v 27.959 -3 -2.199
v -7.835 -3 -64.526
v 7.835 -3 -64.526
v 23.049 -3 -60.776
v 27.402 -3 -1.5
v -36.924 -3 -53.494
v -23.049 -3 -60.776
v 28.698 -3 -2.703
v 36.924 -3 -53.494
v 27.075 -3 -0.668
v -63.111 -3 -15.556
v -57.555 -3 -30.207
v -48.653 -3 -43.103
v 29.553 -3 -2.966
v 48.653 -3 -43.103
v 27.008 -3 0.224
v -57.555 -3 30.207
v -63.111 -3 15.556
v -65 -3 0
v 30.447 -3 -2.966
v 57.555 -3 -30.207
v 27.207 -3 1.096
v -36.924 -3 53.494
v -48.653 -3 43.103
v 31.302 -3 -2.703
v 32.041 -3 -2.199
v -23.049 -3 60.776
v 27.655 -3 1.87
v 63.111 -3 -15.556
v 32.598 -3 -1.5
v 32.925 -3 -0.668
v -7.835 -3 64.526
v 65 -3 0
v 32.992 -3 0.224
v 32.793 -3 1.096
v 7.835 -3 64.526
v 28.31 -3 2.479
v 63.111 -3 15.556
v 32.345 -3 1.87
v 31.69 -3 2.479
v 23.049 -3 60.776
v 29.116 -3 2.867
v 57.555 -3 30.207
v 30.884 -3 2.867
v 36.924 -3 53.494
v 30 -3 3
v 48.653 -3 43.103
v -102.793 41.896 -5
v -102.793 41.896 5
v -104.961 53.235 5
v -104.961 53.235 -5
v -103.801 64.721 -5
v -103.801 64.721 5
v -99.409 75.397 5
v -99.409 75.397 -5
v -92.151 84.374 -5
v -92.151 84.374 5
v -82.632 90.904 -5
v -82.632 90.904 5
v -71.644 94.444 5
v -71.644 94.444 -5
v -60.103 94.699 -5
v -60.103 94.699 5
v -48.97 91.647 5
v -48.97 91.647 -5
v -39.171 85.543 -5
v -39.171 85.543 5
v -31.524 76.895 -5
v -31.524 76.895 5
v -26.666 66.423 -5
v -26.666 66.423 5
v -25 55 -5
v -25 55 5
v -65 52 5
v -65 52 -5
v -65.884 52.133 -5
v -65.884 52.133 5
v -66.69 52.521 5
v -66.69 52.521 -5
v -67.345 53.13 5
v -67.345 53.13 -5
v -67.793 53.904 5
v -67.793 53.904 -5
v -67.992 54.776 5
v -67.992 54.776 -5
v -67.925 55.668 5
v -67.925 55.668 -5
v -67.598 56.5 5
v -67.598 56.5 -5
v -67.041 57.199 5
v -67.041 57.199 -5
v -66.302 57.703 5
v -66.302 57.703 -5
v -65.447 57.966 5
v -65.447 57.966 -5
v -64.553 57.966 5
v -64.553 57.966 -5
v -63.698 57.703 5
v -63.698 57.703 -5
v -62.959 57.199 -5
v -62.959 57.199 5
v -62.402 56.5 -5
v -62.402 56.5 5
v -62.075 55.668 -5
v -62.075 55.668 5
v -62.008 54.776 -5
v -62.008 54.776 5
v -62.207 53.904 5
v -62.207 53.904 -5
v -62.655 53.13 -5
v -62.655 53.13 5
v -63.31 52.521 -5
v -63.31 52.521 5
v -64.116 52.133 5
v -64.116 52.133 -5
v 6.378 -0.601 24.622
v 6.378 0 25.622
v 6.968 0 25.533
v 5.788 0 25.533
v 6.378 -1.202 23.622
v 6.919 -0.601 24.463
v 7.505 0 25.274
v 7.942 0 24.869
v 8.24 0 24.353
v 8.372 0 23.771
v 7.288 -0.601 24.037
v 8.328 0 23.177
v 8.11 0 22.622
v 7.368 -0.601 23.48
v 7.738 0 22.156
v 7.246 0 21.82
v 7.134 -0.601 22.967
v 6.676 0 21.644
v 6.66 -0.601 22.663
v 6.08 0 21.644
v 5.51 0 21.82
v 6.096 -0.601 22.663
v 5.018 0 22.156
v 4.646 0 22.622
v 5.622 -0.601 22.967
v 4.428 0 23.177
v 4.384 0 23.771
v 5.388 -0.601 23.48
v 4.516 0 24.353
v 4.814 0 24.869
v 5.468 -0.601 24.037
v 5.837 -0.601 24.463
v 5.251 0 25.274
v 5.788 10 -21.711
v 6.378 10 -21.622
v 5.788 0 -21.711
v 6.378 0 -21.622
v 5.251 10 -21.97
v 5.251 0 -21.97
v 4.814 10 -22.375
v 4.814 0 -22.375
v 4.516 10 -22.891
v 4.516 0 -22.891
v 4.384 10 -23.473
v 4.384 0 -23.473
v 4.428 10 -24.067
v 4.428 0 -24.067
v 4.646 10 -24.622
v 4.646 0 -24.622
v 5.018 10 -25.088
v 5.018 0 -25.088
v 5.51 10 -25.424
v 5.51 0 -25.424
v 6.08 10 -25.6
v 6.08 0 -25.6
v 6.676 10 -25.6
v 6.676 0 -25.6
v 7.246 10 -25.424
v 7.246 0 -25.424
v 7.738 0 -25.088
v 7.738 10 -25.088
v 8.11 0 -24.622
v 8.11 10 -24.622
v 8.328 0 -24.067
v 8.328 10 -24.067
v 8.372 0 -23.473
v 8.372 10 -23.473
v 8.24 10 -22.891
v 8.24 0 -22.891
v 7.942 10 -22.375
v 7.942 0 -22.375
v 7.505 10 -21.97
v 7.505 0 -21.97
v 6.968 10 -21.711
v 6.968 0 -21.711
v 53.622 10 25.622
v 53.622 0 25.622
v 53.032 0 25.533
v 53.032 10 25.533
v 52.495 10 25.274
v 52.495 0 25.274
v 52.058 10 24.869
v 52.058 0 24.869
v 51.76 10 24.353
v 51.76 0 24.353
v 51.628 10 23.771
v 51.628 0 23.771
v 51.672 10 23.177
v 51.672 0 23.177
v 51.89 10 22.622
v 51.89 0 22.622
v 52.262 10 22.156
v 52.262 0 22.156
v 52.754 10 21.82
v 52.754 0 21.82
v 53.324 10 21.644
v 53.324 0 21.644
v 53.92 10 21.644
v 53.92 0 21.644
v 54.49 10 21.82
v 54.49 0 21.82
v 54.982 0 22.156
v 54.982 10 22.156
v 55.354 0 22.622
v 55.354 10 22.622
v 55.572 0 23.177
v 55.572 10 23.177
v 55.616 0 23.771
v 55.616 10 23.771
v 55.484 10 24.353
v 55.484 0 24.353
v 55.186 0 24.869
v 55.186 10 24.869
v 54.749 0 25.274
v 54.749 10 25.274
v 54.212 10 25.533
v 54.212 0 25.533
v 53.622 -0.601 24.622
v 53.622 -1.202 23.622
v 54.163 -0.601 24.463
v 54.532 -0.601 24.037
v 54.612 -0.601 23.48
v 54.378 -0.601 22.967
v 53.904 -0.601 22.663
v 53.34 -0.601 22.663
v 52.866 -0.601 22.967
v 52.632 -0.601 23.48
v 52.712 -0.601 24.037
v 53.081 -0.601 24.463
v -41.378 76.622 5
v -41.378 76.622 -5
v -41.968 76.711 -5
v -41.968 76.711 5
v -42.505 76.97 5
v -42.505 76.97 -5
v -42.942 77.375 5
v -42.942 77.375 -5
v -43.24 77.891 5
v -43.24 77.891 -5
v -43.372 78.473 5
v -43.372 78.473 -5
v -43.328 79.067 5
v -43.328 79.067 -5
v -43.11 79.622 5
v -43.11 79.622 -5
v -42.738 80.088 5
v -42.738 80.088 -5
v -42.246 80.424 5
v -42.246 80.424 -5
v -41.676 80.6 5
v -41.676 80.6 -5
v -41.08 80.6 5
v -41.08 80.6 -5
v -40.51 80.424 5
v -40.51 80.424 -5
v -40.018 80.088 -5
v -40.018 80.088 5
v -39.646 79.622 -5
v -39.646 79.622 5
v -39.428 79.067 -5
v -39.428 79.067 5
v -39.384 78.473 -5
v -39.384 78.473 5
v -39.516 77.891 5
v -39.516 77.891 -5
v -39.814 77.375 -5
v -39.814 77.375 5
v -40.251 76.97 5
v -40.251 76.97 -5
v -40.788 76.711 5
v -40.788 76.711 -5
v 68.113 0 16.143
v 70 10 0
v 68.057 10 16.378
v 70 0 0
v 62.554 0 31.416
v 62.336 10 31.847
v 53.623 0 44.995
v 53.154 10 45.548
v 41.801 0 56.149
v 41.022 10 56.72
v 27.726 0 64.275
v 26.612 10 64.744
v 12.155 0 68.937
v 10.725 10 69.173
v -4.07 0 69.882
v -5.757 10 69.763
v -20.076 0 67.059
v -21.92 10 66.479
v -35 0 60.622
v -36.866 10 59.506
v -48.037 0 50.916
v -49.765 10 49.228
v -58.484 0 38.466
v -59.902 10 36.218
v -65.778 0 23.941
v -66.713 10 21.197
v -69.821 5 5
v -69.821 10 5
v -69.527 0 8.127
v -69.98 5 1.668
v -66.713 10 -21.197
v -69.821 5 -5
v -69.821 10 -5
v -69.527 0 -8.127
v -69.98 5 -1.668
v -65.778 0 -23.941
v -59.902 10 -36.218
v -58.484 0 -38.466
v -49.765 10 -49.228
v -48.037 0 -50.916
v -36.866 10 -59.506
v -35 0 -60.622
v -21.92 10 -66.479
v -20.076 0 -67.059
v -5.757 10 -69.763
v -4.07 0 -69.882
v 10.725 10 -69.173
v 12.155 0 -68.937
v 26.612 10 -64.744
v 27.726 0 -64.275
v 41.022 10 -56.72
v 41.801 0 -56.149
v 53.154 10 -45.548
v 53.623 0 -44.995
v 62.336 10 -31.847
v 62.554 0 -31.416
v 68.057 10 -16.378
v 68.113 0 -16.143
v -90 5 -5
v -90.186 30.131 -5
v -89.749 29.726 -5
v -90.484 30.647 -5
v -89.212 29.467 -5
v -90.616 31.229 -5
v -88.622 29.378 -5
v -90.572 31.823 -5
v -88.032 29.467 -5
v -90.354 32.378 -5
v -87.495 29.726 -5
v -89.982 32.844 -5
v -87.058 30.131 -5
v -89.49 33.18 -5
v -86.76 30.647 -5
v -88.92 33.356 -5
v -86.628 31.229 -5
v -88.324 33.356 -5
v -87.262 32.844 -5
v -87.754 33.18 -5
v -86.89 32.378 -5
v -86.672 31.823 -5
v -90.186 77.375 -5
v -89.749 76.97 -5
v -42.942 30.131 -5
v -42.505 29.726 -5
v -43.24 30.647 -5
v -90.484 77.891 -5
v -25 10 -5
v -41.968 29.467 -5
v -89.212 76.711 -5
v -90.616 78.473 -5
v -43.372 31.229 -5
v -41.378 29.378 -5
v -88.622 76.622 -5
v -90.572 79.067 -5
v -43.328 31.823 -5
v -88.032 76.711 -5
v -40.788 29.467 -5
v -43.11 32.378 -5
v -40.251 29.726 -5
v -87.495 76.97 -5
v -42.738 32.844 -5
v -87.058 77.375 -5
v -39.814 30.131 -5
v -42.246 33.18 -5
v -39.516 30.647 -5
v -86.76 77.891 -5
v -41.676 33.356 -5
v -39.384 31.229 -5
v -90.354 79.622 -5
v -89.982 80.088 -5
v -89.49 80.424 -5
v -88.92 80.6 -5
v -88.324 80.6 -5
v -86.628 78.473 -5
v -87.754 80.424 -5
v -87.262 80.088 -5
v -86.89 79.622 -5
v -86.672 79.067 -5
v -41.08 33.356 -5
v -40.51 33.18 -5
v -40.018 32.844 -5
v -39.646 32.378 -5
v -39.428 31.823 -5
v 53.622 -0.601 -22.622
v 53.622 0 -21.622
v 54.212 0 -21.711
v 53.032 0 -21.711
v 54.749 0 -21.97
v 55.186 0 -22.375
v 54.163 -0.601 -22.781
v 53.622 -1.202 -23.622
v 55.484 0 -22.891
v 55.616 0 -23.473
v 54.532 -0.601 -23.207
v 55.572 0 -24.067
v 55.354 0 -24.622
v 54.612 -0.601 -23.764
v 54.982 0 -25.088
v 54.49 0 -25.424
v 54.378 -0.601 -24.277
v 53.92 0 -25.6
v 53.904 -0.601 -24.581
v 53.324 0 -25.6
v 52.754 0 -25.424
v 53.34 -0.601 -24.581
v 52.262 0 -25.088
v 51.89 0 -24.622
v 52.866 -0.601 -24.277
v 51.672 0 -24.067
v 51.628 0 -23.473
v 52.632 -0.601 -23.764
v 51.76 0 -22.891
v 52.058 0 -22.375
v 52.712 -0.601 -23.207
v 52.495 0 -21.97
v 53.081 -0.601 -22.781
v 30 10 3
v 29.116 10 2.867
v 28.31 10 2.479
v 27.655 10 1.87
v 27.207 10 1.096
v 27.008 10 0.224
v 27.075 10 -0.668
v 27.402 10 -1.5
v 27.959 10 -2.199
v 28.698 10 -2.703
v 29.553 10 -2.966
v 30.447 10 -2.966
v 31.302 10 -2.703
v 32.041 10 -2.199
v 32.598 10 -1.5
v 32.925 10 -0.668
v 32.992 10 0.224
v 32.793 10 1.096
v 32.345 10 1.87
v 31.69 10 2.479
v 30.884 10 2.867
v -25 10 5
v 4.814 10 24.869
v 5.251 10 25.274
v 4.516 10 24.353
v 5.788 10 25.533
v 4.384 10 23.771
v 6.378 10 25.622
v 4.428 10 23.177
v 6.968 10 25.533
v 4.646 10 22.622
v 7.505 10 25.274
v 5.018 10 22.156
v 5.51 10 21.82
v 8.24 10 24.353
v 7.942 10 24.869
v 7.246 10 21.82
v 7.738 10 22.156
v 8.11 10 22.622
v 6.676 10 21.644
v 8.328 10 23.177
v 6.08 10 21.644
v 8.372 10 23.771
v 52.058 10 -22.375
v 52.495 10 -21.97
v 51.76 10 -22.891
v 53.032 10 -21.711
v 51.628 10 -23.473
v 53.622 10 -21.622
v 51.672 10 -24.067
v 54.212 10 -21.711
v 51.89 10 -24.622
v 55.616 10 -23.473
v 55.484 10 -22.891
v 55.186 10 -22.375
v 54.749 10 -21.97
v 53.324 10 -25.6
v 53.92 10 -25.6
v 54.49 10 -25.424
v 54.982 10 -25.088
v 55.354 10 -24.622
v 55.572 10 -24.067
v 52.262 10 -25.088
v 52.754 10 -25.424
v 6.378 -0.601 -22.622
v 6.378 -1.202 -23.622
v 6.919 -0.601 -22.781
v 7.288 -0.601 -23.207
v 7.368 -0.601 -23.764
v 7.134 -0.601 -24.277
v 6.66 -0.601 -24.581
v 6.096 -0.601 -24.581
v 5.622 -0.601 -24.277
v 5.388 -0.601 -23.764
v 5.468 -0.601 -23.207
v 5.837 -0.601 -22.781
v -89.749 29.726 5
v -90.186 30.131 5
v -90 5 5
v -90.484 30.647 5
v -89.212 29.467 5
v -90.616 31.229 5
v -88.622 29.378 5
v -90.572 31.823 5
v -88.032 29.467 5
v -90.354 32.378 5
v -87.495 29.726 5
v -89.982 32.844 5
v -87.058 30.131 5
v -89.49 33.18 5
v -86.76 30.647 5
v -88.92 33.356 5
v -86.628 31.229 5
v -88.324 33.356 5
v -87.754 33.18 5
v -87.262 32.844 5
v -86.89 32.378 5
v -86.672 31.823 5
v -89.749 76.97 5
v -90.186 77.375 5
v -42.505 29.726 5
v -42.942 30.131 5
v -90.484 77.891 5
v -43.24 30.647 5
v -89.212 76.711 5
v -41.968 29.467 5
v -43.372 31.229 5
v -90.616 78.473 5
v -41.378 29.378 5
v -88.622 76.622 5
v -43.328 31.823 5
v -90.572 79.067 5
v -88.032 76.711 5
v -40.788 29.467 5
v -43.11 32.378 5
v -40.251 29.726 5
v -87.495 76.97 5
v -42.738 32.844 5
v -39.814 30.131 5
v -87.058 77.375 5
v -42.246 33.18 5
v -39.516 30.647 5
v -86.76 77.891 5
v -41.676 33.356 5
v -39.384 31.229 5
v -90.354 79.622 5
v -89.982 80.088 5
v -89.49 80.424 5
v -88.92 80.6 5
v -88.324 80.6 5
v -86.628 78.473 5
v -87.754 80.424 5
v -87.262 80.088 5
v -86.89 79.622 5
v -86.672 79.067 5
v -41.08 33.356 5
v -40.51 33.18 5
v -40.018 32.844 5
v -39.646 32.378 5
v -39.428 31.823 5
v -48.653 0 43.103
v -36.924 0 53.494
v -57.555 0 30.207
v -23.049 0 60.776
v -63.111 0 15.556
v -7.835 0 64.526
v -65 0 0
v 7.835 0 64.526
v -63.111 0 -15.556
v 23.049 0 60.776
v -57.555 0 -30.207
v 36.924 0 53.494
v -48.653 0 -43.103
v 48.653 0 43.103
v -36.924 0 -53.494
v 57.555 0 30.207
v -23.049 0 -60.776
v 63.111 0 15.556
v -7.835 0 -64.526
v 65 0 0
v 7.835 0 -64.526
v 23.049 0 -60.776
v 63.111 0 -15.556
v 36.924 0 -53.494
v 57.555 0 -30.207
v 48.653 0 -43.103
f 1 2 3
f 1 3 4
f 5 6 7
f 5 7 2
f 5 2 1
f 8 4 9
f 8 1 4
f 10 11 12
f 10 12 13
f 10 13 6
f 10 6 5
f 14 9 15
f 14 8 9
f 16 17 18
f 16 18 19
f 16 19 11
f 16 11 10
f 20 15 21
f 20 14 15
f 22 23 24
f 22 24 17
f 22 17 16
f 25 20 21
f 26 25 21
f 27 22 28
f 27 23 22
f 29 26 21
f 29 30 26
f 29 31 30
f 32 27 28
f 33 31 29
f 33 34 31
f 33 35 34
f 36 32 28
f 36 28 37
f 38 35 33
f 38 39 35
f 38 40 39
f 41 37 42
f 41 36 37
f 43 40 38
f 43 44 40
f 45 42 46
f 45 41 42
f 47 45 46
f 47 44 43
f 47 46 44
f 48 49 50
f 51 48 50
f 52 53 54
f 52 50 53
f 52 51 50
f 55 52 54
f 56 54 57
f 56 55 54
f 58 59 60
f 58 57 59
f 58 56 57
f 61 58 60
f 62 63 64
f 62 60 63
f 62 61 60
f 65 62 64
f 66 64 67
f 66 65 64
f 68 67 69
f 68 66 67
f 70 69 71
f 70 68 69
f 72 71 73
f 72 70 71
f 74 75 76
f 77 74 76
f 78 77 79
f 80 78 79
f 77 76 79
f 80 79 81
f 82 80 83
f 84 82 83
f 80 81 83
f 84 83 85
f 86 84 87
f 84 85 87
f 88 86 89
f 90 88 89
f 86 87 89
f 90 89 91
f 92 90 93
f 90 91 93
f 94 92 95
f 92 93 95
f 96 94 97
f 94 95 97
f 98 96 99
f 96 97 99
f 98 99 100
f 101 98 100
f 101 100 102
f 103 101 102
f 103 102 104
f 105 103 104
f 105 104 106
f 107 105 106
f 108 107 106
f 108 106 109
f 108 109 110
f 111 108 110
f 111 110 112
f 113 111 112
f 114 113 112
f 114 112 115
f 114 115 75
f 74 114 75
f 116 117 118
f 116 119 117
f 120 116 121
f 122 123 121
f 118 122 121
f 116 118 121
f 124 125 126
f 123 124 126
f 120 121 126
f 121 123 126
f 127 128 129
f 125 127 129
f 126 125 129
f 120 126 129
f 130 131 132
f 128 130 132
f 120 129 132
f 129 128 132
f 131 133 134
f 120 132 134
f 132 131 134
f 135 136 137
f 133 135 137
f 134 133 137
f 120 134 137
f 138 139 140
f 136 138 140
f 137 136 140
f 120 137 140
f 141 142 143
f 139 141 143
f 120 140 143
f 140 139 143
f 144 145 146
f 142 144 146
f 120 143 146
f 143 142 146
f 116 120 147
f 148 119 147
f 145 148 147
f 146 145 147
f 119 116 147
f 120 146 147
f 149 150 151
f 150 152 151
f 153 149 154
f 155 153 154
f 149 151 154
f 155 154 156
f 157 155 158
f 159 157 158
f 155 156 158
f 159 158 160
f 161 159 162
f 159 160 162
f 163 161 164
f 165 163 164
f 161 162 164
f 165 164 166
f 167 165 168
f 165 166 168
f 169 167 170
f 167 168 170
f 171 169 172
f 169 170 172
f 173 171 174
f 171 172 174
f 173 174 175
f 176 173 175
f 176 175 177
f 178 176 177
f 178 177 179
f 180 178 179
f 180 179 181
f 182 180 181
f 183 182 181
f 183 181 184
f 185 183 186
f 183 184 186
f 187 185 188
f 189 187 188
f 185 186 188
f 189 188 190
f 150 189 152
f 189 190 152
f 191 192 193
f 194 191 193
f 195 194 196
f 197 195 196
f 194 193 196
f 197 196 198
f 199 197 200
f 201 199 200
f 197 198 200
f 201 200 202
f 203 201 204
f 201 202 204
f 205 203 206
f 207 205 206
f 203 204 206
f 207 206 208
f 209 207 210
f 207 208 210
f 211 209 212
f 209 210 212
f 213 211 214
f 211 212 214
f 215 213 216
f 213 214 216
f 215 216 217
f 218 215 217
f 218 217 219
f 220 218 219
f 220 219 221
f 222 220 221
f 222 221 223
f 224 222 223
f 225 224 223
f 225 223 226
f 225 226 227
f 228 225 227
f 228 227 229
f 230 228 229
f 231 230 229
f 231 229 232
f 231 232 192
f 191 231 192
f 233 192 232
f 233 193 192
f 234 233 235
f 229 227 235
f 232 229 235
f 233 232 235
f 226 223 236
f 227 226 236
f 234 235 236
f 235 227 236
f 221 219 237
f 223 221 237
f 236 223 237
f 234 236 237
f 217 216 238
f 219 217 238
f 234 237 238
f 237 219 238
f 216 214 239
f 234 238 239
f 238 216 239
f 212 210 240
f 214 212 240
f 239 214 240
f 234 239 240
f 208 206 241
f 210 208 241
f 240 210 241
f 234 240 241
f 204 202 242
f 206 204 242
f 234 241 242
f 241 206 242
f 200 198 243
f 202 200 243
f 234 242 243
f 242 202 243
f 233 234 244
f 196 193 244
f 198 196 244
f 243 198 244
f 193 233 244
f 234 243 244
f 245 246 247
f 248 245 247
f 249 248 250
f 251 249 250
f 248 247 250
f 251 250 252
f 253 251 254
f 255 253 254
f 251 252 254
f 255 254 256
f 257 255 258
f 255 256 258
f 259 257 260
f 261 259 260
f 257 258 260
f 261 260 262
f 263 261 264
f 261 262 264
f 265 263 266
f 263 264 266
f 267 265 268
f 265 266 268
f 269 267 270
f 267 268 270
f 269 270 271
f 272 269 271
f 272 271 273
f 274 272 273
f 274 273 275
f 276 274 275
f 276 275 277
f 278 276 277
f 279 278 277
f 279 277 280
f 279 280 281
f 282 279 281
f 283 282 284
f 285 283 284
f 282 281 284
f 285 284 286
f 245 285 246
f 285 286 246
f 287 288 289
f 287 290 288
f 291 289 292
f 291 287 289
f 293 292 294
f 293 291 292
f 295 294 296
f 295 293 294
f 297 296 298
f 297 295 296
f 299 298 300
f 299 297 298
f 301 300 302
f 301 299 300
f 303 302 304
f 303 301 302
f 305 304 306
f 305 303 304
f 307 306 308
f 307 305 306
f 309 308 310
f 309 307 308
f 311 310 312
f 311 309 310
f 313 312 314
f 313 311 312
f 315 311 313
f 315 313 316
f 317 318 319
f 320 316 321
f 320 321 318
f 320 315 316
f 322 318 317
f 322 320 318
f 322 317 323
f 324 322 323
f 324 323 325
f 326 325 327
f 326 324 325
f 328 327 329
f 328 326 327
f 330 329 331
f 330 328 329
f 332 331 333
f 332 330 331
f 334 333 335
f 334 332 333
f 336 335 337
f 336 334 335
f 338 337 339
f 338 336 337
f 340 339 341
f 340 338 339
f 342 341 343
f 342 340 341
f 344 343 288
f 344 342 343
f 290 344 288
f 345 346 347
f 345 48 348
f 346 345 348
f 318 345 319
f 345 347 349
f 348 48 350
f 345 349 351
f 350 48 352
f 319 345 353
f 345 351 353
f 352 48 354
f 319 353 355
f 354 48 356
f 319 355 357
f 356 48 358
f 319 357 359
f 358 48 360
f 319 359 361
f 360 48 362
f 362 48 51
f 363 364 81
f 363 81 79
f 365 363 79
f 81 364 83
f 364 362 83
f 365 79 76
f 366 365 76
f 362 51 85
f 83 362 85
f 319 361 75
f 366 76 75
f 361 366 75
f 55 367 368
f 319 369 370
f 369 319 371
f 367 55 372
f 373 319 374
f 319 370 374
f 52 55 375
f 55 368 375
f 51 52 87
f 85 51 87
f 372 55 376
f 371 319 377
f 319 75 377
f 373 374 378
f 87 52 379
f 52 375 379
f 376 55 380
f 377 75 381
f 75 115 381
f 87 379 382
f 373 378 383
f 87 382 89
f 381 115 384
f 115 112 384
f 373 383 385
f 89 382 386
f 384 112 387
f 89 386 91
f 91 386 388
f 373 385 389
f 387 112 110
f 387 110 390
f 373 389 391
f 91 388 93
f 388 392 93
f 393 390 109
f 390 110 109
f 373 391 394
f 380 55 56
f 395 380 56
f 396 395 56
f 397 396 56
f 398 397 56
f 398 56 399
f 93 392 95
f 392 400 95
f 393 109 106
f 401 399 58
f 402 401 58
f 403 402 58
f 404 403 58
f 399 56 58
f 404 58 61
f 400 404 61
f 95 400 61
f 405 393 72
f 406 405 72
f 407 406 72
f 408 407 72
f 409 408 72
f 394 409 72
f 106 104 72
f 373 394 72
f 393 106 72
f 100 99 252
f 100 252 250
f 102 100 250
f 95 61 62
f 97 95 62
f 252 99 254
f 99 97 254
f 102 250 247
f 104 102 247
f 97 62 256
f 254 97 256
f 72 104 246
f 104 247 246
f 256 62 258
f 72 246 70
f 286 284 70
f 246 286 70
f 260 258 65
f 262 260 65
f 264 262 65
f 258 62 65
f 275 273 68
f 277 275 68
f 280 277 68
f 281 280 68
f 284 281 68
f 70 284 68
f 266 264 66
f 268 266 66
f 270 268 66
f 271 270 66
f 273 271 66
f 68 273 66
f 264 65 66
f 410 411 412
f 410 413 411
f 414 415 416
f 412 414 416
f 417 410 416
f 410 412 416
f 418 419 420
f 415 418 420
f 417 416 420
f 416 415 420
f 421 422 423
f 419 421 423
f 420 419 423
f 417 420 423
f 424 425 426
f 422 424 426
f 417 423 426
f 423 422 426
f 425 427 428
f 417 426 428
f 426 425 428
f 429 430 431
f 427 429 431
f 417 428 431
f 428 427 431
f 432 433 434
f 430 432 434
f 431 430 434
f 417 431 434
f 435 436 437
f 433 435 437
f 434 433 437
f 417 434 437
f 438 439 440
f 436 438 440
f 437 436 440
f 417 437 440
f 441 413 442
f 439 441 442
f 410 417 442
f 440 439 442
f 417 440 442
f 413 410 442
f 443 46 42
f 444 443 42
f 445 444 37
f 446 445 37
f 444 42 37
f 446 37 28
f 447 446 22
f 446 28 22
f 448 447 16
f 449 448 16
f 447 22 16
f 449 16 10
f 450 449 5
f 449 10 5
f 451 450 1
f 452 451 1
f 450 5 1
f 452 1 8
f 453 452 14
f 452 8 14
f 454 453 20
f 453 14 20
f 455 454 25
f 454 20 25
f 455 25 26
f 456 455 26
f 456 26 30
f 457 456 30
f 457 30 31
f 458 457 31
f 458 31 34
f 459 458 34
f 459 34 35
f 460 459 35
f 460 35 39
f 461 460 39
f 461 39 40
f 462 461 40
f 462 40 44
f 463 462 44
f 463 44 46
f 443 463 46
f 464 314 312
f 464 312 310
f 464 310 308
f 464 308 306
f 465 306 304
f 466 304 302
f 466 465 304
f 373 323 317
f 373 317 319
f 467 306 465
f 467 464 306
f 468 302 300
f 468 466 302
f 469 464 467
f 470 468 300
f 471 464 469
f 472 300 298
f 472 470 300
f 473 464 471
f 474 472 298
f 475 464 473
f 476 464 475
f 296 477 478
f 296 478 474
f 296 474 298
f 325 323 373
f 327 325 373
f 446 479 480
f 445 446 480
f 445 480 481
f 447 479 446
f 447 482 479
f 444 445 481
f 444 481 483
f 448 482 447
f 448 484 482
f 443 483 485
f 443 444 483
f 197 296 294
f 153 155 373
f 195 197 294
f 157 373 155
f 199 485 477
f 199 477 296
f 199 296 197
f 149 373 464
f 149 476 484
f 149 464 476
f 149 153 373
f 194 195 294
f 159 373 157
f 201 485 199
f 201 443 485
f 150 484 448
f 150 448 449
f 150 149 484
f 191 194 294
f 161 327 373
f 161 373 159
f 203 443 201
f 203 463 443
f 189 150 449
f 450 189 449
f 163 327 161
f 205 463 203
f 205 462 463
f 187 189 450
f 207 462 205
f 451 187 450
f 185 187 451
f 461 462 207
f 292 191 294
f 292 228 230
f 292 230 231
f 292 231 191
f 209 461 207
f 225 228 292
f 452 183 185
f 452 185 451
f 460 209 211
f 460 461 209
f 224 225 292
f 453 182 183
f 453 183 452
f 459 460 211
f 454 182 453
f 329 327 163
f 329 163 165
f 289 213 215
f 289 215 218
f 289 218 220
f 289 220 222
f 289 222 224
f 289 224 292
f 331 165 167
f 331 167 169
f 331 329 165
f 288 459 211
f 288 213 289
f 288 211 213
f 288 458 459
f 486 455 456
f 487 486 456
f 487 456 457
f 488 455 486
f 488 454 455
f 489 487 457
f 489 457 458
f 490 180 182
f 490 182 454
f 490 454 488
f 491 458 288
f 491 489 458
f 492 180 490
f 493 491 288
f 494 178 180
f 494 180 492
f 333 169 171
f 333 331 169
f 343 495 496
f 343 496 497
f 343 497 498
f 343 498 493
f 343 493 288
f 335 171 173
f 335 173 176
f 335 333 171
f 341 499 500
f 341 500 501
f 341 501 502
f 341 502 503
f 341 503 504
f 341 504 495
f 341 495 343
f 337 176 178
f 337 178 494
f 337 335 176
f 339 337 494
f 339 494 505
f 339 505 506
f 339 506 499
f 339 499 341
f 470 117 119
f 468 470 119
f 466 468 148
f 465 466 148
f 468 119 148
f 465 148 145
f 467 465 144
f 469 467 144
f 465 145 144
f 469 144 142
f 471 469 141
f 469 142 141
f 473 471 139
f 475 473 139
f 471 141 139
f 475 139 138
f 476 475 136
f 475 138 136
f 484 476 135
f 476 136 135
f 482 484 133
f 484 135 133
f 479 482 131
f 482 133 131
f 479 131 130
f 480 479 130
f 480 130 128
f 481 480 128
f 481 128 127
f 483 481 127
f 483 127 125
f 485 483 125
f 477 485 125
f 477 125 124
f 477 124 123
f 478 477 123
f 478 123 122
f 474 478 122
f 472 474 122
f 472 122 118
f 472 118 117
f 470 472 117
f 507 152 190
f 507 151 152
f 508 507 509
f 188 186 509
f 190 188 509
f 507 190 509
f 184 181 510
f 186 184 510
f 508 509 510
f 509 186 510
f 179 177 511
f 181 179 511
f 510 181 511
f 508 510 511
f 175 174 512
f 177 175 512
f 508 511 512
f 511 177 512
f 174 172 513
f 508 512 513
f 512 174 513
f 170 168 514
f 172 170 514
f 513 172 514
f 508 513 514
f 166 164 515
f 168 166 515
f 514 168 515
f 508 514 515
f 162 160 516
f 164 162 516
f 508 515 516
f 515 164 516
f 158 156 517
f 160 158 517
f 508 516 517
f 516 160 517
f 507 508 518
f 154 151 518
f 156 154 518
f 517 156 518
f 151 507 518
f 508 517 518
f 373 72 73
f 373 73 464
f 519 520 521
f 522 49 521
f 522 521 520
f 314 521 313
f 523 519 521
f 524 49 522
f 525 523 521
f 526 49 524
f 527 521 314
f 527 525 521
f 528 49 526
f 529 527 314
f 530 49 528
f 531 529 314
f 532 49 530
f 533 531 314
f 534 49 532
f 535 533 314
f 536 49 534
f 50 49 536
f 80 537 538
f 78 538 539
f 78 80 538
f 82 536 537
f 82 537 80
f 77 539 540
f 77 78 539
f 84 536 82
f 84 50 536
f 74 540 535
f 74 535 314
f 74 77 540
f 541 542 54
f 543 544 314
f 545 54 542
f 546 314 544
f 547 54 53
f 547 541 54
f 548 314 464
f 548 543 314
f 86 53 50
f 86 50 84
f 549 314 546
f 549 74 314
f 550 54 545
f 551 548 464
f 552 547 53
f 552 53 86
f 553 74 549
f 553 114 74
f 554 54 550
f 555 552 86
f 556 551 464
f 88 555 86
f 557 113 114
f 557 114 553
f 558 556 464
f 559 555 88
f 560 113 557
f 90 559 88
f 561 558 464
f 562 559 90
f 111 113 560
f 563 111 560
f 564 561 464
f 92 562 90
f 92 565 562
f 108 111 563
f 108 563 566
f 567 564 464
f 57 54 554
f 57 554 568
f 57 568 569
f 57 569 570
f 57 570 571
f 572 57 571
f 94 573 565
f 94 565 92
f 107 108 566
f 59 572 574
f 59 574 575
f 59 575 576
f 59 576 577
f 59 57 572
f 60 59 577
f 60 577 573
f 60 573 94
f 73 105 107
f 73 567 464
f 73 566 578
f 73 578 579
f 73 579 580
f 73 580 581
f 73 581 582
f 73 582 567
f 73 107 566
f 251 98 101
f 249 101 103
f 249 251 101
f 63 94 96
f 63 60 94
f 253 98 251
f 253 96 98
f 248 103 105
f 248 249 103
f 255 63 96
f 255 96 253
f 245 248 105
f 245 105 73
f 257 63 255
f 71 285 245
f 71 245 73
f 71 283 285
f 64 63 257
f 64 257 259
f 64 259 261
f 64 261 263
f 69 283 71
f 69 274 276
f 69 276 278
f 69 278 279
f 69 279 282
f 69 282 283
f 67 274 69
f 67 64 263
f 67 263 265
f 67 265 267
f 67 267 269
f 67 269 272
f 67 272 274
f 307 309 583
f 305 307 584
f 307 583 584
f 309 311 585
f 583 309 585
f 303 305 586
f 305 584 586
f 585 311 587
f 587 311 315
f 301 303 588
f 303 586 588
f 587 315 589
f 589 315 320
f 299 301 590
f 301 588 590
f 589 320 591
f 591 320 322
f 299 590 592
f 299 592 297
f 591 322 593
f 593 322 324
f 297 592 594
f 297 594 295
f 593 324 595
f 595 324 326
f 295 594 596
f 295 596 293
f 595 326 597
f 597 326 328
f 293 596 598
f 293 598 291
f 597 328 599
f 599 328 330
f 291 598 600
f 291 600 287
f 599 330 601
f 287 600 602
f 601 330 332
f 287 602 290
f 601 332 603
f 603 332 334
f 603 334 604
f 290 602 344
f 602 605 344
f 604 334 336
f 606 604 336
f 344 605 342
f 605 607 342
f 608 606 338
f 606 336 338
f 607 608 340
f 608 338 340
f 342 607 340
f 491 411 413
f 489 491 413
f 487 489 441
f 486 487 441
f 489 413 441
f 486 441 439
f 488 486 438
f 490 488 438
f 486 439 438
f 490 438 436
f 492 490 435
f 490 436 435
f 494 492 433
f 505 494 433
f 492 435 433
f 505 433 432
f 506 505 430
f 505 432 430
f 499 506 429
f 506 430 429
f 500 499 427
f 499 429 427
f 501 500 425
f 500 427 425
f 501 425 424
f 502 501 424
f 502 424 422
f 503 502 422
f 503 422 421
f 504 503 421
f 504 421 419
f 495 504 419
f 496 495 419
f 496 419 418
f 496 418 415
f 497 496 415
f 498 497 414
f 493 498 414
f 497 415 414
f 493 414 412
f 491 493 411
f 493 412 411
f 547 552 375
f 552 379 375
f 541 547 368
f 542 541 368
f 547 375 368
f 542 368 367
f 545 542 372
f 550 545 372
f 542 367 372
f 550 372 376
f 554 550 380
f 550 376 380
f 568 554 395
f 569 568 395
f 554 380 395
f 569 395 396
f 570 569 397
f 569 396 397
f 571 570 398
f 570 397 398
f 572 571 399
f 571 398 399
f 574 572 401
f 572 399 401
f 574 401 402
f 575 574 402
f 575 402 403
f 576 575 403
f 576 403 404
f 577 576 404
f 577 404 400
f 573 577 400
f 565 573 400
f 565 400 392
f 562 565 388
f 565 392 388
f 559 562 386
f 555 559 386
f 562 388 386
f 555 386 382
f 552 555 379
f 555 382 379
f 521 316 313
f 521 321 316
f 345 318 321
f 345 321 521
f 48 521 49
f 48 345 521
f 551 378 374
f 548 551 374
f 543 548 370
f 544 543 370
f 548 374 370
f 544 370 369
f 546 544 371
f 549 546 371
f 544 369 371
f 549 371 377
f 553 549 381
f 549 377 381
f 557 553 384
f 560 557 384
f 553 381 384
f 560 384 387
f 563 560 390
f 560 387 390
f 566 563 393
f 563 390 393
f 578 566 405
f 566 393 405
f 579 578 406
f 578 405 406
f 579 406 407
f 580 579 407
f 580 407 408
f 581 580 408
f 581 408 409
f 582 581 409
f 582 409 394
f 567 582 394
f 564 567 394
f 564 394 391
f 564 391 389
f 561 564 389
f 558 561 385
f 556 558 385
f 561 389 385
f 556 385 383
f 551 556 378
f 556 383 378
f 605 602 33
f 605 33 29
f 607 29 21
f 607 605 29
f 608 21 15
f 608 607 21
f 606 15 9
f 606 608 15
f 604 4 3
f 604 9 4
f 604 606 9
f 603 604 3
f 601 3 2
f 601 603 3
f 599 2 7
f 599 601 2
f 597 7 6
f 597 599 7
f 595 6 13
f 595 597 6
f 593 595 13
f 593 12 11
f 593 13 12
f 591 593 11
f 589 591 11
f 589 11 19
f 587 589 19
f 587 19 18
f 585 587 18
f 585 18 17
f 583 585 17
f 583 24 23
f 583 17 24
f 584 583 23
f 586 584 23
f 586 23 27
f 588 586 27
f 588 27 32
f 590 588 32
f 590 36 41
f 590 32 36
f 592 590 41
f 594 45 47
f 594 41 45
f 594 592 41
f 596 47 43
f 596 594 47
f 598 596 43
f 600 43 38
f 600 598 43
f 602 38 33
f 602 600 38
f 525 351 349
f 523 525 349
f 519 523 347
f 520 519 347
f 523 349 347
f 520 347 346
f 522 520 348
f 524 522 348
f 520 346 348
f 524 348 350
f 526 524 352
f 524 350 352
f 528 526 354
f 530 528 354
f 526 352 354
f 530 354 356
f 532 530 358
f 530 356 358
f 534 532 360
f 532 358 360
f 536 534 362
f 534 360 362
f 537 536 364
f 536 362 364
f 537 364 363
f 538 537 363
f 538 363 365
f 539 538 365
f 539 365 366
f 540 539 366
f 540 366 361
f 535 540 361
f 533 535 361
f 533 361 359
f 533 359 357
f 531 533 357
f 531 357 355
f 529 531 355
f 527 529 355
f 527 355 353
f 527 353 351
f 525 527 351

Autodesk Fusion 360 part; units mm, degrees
sketch "Sketch1" plane through (0, 0, 0) normal (0, 1, 0) x (1, 0, 0)
  circle A0 centre (0, 0) radius 70
  dimension "d1" = 140
extrude "Extrude1" add sketch "Sketch1" along normal blind 10
sketch "Sketch2" plane through (0, 0, 0) normal (0, -1, 0) x (1, 0, 0)
  circle A0 centre (0, 0) radius 70
  circle A1 centre (0, 0) radius 65
  dimension "d4" = -5
extrude "Extrude2" add sketch "Sketch2" along normal blind 3 contours A1
sketch "Sketch3" plane through (0, 0, 0) normal (0, 0, 1) x (1, 0, 0)
  line L0 (-25, 55) -> (-25, 5)
  line L1 (-25, 5) -> (-90, 5)
  line L2 (-90, 5) -> (-102.7928, 41.8964)
  arc A0 (-25, 55) -> (-102.7928, 41.8964) centre (-65, 55) ccw
  dimension "d7" = 50
  dimension "d8" = 65
  dimension "d9" = 40
  dimension "d10" = 5
  dimension "d11" = 25
extrude "Extrude3" add sketch "Sketch3" along normal mid plane 10
sketch "Sketch4" plane through (0, 10, 0) normal (0, 1, 0) x (-1, 0, 0)
  line L0 (25, 5) -> (69.8212, 5)
  arc A0 (69.8212, 5) -> (69.8212, -5) centre (0, 0) ccw
  line L1 (69.8212, -5) -> (25, -5)
  line L2 (25, -5) -> (25, 5)
  line L3 (-6.378, -23.622) -> (-53.622, -23.622)
  line L4 (-53.622, -23.622) -> (-53.622, 23.622)
  line L5 (-53.622, 23.622) -> (-6.378, 23.622)
  line L6 (-6.378, 23.622) -> (-6.378, -23.622)
  line L7 (-6.378, -23.622) -> (-53.622, 23.622) construction
  line L8 (-53.622, -23.622) -> (-6.378, 23.622) construction
  point P0 (-30, 0)
  dimension "d14" = 47.244
  dimension "d15" = 47.244
  dimension "d16" = 30
hole "Hole1" at (6.378, 10, 23.622) at (6.378, 10, -23.622) at (53.622, 10, -23.622) at (53.622, 10, 23.622) direction (0, -1, 0) diameter 4 depth 10 tip angle 118
hole "Hole2" at (30, 10, 0) direction (0, -1, 0) diameter 6 depth 15 tip angle 118
sketch "Sketch5" plane through (0, 0, 5) normal (0, 0, 1) x (1, 0, 0)
  line L0 (-69.8212, 10) -> (-25, 10)
  line L1 (-25, 10) -> (-25, 55)
  arc A0 (-25, 55) -> (-102.7928, 41.8964) centre (-65, 55) ccw
  line L2 (-102.7928, 41.8964) -> (-90, 5)
  line L3 (-90, 5) -> (-69.8212, 5)
  line L4 (-69.8212, 5) -> (-69.8212, 10)
  line L5 (-41.378, 78.622) -> (-88.622, 78.622)
  line L6 (-88.622, 78.622) -> (-88.622, 31.378)
  line L7 (-88.622, 31.378) -> (-41.378, 31.378)
  line L8 (-41.378, 31.378) -> (-41.378, 78.622)
  line L9 (-41.378, 78.622) -> (-88.622, 31.378) construction
  line L10 (-88.622, 78.622) -> (-41.378, 31.378) construction
  point P0 (-65, 55)
  dimension "d23" = 47.244
  dimension "d24" = 47.244
hole "Hole3" at (-88.622, 78.622, 5) at (-41.378, 78.622, 5) at (-41.378, 31.378, 5) at (-88.622, 31.378, 5) direction (0, 0, -1) diameter 4 depth 40 tip angle 118
hole "Hole4" at (-65, 55, 5) direction (0, 0, -1) diameter 6 depth 40 tip angle 118
